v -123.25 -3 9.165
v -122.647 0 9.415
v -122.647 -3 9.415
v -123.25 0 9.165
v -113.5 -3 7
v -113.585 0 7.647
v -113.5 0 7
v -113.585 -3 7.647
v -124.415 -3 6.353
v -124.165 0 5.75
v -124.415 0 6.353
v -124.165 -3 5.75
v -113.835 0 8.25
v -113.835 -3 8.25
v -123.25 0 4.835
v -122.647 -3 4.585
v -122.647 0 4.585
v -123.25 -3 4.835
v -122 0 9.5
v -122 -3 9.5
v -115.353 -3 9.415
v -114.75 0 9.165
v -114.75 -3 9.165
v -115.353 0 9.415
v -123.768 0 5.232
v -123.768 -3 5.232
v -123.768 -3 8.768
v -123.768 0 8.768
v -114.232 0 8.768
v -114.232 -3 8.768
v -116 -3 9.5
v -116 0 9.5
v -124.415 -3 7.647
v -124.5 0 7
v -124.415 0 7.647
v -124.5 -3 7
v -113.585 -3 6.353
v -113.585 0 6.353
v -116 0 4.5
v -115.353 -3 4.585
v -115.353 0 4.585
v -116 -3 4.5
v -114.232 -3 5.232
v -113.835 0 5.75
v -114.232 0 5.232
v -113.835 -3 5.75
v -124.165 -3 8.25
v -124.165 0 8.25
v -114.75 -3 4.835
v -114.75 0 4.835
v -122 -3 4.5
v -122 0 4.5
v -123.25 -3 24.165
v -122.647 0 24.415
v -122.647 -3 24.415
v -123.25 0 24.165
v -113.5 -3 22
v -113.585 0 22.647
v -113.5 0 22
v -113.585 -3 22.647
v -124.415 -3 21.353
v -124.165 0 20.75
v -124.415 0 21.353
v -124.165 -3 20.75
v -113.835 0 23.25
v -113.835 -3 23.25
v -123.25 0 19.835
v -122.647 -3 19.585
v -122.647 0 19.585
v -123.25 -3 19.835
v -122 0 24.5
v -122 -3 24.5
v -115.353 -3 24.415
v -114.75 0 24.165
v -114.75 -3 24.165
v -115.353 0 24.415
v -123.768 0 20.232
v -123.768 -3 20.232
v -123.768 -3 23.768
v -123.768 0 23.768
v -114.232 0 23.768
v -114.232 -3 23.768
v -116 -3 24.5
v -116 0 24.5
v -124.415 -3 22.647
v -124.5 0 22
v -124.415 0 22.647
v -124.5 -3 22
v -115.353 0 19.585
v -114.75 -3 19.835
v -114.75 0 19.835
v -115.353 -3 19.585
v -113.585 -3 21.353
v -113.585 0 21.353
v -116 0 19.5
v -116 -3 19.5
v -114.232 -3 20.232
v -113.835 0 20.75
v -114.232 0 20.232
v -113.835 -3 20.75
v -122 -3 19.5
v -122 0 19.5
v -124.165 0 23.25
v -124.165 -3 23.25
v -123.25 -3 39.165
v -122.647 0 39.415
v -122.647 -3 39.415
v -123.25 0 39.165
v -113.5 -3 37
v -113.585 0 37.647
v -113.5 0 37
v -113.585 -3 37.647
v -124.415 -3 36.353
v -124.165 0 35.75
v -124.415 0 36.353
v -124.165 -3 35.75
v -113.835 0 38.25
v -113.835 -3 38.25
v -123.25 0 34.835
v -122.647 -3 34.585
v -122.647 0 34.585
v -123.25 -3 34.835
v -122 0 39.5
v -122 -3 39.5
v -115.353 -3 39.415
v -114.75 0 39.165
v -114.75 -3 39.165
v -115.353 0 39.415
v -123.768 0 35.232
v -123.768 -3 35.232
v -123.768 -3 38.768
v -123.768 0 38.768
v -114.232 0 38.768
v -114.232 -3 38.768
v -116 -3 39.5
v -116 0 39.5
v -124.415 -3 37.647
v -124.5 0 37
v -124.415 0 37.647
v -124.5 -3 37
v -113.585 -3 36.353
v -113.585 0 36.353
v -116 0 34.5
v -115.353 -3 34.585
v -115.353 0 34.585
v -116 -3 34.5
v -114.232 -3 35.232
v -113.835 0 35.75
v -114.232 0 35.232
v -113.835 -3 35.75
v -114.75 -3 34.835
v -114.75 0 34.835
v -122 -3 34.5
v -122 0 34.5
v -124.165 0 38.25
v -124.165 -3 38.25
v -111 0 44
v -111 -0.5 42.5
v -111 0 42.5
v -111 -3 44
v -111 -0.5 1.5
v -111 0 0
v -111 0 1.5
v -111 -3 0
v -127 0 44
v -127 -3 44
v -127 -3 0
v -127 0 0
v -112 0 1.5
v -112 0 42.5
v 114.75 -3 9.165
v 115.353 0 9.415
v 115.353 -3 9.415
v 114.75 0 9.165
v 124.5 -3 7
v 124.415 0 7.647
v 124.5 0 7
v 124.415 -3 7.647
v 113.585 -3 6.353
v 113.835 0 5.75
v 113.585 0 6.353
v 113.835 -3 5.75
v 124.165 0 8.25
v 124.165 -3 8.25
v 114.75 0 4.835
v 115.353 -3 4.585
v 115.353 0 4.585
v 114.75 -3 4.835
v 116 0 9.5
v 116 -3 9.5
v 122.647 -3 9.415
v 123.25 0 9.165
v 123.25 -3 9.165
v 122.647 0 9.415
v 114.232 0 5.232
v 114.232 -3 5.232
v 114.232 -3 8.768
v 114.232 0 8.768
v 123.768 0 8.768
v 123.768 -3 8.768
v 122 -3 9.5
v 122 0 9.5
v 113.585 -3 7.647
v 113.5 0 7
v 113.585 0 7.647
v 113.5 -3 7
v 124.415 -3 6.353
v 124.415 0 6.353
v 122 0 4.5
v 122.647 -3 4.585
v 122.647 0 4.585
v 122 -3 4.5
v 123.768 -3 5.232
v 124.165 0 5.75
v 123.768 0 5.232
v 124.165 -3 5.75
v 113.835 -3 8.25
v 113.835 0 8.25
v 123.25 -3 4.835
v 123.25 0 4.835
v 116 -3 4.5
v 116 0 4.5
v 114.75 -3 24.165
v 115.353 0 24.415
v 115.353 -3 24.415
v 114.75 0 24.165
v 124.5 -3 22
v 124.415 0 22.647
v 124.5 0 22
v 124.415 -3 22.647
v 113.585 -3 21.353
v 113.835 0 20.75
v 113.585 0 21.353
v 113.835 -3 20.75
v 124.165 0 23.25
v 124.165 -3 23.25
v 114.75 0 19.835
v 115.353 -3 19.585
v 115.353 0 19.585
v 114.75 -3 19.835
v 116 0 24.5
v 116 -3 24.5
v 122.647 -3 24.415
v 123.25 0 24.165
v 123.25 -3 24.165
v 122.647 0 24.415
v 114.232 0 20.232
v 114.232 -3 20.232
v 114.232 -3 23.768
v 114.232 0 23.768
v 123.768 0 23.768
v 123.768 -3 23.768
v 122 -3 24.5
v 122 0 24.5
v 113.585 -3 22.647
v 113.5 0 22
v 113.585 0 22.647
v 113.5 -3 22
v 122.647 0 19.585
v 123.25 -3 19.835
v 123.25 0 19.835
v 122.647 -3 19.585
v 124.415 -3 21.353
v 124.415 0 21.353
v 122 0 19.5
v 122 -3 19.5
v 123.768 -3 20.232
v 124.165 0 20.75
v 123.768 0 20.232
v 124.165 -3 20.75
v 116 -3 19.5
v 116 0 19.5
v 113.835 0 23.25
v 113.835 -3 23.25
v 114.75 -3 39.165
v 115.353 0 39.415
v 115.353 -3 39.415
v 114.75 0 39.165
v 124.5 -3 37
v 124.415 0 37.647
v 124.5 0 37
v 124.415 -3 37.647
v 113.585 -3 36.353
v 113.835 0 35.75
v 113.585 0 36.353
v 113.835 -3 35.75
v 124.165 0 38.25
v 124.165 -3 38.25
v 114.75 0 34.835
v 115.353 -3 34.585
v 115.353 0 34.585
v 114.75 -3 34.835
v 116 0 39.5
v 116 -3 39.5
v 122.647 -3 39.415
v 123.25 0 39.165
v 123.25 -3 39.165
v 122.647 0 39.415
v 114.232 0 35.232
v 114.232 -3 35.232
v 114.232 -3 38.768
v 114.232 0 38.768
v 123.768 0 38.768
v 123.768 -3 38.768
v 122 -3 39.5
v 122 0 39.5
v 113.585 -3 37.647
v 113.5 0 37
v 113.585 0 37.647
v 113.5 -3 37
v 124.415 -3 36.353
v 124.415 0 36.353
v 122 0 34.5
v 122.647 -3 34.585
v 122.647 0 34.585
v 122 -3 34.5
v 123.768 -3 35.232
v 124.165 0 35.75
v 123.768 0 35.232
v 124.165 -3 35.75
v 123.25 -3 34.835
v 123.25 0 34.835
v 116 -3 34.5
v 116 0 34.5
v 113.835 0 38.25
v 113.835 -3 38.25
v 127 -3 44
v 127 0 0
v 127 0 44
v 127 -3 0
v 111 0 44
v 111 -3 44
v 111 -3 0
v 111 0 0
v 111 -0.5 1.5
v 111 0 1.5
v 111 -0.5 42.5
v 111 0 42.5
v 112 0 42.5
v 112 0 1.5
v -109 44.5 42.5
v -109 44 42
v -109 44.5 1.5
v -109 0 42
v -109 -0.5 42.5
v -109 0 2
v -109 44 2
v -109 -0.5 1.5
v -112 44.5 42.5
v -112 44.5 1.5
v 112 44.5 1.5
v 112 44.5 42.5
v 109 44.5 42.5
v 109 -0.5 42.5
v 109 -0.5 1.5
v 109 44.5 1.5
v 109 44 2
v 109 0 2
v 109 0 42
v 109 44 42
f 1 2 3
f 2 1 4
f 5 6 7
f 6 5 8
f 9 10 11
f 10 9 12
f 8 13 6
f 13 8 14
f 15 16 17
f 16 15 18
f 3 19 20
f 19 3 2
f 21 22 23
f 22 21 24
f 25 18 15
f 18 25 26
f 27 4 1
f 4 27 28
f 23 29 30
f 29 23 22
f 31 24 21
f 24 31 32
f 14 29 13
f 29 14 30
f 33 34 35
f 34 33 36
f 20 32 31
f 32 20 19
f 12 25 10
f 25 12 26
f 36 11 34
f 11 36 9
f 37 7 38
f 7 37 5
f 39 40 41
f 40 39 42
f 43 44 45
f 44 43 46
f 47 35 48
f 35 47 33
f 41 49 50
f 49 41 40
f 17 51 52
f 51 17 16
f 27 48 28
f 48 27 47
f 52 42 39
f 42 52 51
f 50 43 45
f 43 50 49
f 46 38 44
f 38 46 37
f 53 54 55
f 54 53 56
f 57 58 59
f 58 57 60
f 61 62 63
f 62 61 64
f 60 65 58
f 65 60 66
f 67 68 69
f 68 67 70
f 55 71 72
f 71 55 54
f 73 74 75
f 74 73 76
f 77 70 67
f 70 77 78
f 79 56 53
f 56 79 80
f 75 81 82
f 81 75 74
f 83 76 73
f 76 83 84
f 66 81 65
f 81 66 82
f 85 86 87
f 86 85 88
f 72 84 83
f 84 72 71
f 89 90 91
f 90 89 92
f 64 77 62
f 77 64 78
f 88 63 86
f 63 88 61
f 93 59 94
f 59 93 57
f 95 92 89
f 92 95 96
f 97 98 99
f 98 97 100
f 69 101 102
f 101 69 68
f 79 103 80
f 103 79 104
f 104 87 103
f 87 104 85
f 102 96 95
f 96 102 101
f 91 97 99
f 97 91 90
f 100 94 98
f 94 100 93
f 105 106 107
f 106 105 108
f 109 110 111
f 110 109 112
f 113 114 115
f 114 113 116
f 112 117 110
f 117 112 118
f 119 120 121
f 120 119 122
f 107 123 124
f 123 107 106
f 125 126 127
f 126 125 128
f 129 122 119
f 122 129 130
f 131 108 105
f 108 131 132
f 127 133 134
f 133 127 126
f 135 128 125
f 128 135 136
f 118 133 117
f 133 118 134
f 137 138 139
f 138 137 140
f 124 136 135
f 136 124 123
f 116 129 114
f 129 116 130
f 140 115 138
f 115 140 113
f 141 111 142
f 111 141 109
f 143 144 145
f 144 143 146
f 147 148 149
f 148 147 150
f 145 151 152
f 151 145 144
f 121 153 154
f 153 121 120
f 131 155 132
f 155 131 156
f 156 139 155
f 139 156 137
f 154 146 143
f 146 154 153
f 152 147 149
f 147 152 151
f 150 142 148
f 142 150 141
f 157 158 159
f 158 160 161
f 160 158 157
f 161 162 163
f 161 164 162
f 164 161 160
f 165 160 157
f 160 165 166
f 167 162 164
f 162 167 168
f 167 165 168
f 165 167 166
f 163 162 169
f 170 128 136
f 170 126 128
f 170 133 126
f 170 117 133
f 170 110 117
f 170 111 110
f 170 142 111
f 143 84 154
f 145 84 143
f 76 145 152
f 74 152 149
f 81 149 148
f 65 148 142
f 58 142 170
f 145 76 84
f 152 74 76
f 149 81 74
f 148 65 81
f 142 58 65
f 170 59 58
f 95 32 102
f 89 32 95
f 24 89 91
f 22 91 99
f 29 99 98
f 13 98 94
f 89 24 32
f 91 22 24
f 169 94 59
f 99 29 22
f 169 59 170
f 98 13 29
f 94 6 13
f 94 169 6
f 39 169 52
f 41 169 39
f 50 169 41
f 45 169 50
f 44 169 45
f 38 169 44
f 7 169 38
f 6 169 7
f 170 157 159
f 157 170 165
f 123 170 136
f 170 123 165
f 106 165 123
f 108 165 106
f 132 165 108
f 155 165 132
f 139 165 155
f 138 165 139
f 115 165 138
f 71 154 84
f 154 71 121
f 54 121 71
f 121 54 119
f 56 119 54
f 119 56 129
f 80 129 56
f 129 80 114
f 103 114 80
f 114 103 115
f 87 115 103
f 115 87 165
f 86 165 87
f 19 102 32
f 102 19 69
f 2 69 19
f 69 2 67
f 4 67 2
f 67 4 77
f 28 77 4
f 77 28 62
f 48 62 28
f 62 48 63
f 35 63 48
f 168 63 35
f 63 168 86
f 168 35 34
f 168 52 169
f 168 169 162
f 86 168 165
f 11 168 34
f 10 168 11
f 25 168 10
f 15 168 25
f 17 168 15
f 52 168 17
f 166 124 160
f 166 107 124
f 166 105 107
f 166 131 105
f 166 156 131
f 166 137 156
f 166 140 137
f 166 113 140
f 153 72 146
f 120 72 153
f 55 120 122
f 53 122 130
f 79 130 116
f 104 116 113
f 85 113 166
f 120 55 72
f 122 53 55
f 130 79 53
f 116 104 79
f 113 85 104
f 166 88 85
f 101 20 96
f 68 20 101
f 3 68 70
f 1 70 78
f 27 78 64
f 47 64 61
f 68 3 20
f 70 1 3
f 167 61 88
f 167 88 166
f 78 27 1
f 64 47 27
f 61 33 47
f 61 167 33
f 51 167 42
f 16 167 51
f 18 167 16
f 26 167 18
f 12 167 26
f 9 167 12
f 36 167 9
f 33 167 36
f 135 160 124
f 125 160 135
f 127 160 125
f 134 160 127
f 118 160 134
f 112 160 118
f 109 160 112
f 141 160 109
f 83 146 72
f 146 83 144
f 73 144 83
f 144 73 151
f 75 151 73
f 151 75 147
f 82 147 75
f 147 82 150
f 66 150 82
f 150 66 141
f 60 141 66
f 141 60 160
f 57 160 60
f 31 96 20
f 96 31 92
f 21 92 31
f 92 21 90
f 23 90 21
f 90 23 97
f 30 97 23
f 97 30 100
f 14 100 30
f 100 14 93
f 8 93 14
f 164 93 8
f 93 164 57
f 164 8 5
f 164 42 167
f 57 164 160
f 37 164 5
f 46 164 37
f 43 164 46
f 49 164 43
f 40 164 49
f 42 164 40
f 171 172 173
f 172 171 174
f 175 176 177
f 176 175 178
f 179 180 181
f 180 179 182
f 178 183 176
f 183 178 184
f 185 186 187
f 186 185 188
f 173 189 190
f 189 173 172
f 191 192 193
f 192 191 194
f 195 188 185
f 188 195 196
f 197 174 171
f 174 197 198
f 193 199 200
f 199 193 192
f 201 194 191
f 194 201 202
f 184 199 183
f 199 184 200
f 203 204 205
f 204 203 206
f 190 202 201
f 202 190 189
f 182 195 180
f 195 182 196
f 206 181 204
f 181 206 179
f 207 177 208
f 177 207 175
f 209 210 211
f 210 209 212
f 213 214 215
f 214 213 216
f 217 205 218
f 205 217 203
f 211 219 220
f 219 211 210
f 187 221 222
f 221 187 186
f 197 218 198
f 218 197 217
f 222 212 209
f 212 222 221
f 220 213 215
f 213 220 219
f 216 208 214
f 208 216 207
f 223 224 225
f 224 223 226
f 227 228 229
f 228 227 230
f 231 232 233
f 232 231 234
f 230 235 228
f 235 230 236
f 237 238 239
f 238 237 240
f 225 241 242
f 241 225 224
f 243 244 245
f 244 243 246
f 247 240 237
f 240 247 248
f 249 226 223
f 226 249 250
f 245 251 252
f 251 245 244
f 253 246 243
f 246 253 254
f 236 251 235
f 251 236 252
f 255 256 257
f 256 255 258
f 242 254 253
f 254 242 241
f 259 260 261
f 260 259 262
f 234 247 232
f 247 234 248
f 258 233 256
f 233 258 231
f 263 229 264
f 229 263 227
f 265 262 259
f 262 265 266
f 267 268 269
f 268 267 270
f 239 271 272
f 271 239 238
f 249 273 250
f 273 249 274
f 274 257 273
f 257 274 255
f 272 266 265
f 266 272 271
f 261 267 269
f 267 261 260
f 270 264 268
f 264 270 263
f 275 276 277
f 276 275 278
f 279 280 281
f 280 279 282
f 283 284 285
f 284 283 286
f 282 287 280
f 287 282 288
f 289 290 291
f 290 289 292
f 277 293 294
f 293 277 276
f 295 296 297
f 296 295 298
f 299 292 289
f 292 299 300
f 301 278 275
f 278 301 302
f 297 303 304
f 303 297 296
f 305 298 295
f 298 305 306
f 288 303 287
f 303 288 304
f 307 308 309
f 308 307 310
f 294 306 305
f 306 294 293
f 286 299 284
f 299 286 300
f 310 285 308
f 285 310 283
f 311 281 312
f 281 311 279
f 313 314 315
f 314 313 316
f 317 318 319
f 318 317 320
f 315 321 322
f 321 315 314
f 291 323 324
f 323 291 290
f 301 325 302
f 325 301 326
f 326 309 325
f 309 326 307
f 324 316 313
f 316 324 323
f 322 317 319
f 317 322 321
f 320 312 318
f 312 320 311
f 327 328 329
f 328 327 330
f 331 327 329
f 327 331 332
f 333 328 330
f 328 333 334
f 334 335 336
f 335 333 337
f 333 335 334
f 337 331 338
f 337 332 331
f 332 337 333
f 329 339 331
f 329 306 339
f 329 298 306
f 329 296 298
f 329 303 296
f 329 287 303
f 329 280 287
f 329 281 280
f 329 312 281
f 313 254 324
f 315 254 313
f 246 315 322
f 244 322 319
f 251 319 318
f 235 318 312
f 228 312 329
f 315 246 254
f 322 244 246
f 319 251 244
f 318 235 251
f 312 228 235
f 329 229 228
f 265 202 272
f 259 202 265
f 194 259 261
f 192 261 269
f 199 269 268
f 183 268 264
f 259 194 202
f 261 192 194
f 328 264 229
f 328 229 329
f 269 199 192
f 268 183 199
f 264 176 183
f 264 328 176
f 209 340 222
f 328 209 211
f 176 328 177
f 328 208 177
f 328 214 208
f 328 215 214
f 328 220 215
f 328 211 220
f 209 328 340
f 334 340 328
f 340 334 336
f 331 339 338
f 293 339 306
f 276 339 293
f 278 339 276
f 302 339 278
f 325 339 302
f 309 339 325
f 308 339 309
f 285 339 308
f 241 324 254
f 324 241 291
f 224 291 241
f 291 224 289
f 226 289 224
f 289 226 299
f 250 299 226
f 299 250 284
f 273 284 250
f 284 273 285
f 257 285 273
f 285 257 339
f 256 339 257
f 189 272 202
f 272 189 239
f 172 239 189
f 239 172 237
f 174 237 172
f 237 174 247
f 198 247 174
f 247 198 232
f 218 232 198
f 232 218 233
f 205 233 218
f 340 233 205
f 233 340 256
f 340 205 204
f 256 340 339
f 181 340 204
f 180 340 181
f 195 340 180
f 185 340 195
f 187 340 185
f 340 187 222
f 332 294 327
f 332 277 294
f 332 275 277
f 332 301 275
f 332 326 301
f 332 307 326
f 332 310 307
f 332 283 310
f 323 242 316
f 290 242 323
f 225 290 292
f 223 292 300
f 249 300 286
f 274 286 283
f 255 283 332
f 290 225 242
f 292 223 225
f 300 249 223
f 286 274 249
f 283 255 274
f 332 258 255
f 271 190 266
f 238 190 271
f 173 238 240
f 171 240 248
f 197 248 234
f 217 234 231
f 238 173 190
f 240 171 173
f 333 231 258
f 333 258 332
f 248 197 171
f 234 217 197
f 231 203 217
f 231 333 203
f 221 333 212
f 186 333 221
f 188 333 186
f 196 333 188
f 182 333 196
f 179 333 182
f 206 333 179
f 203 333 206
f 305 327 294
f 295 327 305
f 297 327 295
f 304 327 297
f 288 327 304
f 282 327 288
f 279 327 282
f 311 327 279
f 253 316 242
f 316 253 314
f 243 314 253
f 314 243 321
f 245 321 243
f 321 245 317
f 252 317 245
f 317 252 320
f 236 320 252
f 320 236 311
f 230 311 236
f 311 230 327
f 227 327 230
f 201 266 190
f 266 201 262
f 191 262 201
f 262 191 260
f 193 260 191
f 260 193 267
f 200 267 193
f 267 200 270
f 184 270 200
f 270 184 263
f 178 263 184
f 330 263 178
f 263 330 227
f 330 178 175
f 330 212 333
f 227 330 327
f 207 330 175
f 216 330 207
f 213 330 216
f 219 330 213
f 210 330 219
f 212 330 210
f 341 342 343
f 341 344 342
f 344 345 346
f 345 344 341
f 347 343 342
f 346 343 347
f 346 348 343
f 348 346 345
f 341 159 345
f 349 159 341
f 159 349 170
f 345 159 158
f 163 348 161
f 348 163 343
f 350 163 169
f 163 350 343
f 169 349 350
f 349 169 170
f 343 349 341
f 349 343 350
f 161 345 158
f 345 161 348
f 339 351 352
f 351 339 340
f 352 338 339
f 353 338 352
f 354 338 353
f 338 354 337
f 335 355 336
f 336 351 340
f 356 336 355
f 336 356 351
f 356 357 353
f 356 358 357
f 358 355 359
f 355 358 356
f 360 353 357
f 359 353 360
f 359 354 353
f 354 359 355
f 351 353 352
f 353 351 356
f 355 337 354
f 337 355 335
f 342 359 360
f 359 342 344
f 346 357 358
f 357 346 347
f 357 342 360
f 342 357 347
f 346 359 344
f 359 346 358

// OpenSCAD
// Visual stand-in for the ElecVoztile 10" 1U PDU (8 outlets, 125 V 15 A):
// a square aluminium bar with ears, a red rocker switch on the front
// and 8 short pigtails out of the back, ending in NEMA 5-15R sockets.
// Sizes are read off the product photos, not measured. Not a printable part.
// Rack coordinates: X across (0 = centre), Y rearward from the back face
// of the rack ears, Z up from the bottom of the U.
which = "body";    // [body, front, pigtails, sockets]
$fn = 24;

U = 44.45;
bar = [222, 44, 40];      // body W x D x H (square-ish extrusion)
ear = [16, 3, 44];        // each ear, outside the bar
n = 8;
cord_d = 7;
cord_len = 100;           // pigtail length, 4 in
sock = [27, 34, 30];      // moulded 5-15R socket end, W x L x H
z0 = 2;                   // bar bottom above the bottom of the U

module ears() {
    for (s = [-1, 1]) translate([s > 0 ? bar[0] / 2 : -bar[0] / 2 - ear[0], -ear[1], 0])
        difference() {
            cube([ear[0], ear[1], ear[2]]);
            // three horizontal slots, like the photo
            for (z = [7, 22, 37]) translate([ear[0] / 2, ear[1] + 1, z]) rotate([90, 0, 0])
                hull() for (dx = [-3, 3]) translate([dx, 0, 0]) cylinder(d = 5, h = ear[1] + 2);
        }
}

module bar_body() {
    translate([-bar[0] / 2, 0, z0]) cube(bar);
    // end caps, slightly proud
    for (s = [-1, 1]) translate([s > 0 ? bar[0] / 2 - 2 : -bar[0] / 2 - 1, -0.5, z0 - 0.5]) cube([3, bar[1] + 1, bar[2] + 1]);
}

module front_bits() {
    // red rocker switch at the right
    translate([bar[0] / 2 - 40, -2.5, z0 + 11]) cube([11, 2.5, 18]);
}

// grommets along the back face, alternating high and low like the photo
function gx(i) = -bar[0] / 2 + 18 + i * (bar[0] - 36) / (n - 1);
function gz(i) = z0 + (i % 2 == 0 ? 28 : 12);
// low cords hang a bit shorter so the sockets sit in two staggered rows
function glen(i) = i % 2 == 0 ? cord_len : cord_len - 38;
module pigtails() {
    for (i = [0 : n - 1]) {
        x = gx(i); z = gz(i); y0 = bar[1]; L = glen(i);
        // grommet
        translate([x, y0 - 0.5, z]) rotate([-90, 0, 0]) cylinder(d = 12, h = 3);
        // cord: straight out, then sagging a little
        hull() { translate([x, y0 + 2, z]) sphere(d = cord_d); translate([x, y0 + L * 0.55, z - 4]) sphere(d = cord_d); }
        hull() { translate([x, y0 + L * 0.55, z - 4]) sphere(d = cord_d); translate([x, y0 + L, z - 10]) sphere(d = cord_d); }
    }
    // 6 ft mains cord out of the left end
    hull() { translate([-bar[0] / 2, bar[1] / 2, z0 + 20]) sphere(d = 9); translate([-bar[0] / 2 + 6, bar[1] + 60, z0 + 20]) sphere(d = 9); }
}
module sockets() {
    for (i = [0 : n - 1]) {
        x = gx(i); z = gz(i) - 10;
        translate([x - sock[0] / 2, bar[1] + glen(i) - 4, z - sock[2] / 2]) cube(sock);
    }
}

if (which == "body") { ears(); bar_body(); }
if (which == "front") front_bits();
if (which == "pigtails") pigtails();
if (which == "sockets") sockets();
